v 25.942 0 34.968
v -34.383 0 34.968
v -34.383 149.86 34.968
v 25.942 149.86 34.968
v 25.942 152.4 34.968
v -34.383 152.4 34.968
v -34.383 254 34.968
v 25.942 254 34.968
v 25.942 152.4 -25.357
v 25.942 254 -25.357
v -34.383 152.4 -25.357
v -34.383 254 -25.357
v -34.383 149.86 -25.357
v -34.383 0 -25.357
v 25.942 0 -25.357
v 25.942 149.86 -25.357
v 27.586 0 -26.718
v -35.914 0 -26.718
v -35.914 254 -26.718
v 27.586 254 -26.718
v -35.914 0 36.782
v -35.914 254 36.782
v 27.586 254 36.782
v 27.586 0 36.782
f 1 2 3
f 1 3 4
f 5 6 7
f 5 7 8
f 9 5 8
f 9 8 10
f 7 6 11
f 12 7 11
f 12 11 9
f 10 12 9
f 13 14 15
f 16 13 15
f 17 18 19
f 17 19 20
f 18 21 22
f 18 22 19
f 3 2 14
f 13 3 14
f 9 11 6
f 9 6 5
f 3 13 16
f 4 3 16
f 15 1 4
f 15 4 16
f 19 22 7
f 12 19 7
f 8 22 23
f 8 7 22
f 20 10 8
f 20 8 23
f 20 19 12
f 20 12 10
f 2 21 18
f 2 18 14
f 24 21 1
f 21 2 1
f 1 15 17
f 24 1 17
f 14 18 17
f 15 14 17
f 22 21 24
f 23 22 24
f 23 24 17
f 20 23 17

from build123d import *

# Parameters (mm, degrees)
SKETCH1_W           = 63.5
SKETCH1_H           = 63.5
SKETCH1_W_2         = 60.325
SKETCH1_H_2         = 60.325
BOSS_EXTRUDE1_DEPTH = 254
SKETCH3_W           = 60.325
SKETCH3_H           = 60.325
BOSS_EXTRUDE3_DEPTH = 2.54


with BuildPart() as part:
    # Sketch1 → Boss-Extrude1 (new body)
    with BuildSketch(Plane(origin=(0, 0, 0), x_dir=(1, 0, 0), z_dir=(0, 1, 0))):
        with Locations((-4.163673182, -5.031735612)):
            Rectangle(SKETCH1_W, SKETCH1_H)
        with Locations((-4.220828178, -4.80555794)):
            Rectangle(SKETCH1_W_2, SKETCH1_H_2, mode=Mode.SUBTRACT)
    extrude(amount=BOSS_EXTRUDE1_DEPTH)

    # Sketch3 → Boss-Extrude3 (add)
    with BuildSketch(Plane(origin=(0, 152.4, 0), x_dir=(1, 0, 0), z_dir=(0, 1, 0))):
        with Locations((-4.220828178, -4.80555794)):
            Rectangle(SKETCH3_W, SKETCH3_H)
    extrude(amount=-BOSS_EXTRUDE3_DEPTH)


solid = part.part
